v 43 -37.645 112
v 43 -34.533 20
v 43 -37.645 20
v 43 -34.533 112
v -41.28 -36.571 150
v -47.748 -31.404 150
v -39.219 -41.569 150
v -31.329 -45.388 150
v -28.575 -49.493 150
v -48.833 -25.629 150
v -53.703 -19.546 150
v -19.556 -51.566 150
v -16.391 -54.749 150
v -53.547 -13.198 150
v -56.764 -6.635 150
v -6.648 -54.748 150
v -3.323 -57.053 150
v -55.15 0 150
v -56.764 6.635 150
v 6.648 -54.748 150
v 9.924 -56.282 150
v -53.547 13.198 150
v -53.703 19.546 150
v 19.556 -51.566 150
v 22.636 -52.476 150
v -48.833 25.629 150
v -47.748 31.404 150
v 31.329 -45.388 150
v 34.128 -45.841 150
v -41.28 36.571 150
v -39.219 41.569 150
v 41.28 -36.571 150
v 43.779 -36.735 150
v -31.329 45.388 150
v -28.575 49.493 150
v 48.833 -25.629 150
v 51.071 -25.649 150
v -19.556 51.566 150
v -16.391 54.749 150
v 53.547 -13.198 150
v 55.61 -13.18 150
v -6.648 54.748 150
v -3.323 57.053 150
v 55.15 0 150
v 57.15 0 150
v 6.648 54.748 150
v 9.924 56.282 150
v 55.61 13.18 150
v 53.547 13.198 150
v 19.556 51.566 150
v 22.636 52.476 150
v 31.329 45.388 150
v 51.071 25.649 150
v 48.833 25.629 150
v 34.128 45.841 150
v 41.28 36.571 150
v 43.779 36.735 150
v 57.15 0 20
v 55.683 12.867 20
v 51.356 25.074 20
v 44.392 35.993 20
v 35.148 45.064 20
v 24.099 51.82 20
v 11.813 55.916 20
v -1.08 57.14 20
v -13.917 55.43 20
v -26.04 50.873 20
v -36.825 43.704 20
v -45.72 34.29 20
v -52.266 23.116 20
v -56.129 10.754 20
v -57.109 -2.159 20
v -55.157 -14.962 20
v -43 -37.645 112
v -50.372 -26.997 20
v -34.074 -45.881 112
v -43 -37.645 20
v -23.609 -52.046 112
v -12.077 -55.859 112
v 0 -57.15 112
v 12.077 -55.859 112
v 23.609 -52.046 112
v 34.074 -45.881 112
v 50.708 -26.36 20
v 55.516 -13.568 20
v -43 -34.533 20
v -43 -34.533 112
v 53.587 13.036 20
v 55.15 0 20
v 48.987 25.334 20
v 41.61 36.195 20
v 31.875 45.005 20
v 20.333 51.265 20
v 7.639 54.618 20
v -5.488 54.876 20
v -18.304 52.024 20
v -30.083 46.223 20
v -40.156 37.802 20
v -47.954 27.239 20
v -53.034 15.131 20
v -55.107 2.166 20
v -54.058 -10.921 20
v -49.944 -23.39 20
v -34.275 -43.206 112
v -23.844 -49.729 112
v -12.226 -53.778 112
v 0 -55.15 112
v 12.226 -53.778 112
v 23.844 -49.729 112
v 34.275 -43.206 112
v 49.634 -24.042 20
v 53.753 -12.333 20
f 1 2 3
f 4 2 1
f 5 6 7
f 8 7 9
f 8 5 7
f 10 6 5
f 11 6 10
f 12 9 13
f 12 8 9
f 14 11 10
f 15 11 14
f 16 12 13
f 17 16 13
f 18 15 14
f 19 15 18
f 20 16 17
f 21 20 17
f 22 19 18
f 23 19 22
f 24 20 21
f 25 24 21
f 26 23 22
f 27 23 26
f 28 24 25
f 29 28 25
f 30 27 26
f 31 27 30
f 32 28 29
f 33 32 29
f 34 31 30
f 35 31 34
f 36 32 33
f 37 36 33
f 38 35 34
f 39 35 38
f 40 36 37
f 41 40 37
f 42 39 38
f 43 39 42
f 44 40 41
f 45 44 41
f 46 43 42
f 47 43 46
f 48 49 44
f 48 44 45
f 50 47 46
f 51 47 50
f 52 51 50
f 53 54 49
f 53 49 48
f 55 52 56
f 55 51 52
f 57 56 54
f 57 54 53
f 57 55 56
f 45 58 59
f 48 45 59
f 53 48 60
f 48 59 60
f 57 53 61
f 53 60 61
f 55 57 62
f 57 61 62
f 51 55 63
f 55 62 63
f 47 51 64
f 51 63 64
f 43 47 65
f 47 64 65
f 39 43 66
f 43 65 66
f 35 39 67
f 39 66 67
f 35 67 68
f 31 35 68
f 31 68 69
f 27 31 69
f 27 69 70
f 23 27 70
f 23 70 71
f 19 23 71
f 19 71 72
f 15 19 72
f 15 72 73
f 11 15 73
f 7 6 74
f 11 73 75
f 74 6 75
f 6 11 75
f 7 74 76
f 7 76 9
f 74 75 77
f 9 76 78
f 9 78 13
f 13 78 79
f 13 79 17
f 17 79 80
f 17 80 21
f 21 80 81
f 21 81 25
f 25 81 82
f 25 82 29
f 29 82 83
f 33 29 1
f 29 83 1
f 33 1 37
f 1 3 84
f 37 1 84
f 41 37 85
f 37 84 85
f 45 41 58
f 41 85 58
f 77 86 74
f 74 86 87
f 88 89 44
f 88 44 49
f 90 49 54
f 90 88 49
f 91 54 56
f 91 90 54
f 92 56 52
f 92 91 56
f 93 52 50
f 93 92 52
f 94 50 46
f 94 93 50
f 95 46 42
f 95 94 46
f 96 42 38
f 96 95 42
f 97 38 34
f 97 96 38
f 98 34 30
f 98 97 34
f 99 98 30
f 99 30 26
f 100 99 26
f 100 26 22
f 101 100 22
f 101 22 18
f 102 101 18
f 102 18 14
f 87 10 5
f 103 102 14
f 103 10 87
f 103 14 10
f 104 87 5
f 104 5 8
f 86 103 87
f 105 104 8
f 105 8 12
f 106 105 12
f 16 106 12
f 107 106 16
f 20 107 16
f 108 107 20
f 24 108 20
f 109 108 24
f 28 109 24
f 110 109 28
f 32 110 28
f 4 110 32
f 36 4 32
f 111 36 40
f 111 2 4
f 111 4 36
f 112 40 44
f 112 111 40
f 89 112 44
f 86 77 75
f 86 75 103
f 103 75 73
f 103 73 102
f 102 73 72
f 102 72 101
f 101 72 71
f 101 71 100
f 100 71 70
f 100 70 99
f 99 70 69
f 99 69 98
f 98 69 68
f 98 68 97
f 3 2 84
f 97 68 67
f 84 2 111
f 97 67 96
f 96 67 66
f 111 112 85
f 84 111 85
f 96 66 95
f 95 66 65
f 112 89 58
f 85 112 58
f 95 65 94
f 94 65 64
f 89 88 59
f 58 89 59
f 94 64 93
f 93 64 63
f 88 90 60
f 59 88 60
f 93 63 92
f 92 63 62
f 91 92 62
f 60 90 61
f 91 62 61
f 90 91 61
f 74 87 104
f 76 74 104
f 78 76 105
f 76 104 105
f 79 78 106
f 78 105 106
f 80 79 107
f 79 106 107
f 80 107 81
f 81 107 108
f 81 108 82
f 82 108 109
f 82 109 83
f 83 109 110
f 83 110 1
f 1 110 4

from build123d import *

# Parameters (mm, degrees)
SKETCH004_W      = 86
SKETCH004_H      = 92
EXTRUDE005_DEPTH = 68.155048
TUBE_R           = 57.15
TUBE_R_2         = 55.15
TUBE_DEPTH       = 130


with BuildPart() as holeboiler:
    # Sketch004 → Extrude005 (new body)
    with BuildSketch(Plane.XZ):
        with Locations((0, 66)):
            Rectangle(SKETCH004_W, SKETCH004_H)
    extrude(amount=EXTRUDE005_DEPTH)


with BuildPart() as cut:
    # Tube → Tube (new body)
    with BuildSketch(Plane.XY.offset(20)):
        Circle(TUBE_R)
        Circle(TUBE_R_2, mode=Mode.SUBTRACT)
    extrude(amount=TUBE_DEPTH)

    # Cut: cut HoleBoiler
    add(holeboiler.part, mode=Mode.SUBTRACT)


solid = cut.part
